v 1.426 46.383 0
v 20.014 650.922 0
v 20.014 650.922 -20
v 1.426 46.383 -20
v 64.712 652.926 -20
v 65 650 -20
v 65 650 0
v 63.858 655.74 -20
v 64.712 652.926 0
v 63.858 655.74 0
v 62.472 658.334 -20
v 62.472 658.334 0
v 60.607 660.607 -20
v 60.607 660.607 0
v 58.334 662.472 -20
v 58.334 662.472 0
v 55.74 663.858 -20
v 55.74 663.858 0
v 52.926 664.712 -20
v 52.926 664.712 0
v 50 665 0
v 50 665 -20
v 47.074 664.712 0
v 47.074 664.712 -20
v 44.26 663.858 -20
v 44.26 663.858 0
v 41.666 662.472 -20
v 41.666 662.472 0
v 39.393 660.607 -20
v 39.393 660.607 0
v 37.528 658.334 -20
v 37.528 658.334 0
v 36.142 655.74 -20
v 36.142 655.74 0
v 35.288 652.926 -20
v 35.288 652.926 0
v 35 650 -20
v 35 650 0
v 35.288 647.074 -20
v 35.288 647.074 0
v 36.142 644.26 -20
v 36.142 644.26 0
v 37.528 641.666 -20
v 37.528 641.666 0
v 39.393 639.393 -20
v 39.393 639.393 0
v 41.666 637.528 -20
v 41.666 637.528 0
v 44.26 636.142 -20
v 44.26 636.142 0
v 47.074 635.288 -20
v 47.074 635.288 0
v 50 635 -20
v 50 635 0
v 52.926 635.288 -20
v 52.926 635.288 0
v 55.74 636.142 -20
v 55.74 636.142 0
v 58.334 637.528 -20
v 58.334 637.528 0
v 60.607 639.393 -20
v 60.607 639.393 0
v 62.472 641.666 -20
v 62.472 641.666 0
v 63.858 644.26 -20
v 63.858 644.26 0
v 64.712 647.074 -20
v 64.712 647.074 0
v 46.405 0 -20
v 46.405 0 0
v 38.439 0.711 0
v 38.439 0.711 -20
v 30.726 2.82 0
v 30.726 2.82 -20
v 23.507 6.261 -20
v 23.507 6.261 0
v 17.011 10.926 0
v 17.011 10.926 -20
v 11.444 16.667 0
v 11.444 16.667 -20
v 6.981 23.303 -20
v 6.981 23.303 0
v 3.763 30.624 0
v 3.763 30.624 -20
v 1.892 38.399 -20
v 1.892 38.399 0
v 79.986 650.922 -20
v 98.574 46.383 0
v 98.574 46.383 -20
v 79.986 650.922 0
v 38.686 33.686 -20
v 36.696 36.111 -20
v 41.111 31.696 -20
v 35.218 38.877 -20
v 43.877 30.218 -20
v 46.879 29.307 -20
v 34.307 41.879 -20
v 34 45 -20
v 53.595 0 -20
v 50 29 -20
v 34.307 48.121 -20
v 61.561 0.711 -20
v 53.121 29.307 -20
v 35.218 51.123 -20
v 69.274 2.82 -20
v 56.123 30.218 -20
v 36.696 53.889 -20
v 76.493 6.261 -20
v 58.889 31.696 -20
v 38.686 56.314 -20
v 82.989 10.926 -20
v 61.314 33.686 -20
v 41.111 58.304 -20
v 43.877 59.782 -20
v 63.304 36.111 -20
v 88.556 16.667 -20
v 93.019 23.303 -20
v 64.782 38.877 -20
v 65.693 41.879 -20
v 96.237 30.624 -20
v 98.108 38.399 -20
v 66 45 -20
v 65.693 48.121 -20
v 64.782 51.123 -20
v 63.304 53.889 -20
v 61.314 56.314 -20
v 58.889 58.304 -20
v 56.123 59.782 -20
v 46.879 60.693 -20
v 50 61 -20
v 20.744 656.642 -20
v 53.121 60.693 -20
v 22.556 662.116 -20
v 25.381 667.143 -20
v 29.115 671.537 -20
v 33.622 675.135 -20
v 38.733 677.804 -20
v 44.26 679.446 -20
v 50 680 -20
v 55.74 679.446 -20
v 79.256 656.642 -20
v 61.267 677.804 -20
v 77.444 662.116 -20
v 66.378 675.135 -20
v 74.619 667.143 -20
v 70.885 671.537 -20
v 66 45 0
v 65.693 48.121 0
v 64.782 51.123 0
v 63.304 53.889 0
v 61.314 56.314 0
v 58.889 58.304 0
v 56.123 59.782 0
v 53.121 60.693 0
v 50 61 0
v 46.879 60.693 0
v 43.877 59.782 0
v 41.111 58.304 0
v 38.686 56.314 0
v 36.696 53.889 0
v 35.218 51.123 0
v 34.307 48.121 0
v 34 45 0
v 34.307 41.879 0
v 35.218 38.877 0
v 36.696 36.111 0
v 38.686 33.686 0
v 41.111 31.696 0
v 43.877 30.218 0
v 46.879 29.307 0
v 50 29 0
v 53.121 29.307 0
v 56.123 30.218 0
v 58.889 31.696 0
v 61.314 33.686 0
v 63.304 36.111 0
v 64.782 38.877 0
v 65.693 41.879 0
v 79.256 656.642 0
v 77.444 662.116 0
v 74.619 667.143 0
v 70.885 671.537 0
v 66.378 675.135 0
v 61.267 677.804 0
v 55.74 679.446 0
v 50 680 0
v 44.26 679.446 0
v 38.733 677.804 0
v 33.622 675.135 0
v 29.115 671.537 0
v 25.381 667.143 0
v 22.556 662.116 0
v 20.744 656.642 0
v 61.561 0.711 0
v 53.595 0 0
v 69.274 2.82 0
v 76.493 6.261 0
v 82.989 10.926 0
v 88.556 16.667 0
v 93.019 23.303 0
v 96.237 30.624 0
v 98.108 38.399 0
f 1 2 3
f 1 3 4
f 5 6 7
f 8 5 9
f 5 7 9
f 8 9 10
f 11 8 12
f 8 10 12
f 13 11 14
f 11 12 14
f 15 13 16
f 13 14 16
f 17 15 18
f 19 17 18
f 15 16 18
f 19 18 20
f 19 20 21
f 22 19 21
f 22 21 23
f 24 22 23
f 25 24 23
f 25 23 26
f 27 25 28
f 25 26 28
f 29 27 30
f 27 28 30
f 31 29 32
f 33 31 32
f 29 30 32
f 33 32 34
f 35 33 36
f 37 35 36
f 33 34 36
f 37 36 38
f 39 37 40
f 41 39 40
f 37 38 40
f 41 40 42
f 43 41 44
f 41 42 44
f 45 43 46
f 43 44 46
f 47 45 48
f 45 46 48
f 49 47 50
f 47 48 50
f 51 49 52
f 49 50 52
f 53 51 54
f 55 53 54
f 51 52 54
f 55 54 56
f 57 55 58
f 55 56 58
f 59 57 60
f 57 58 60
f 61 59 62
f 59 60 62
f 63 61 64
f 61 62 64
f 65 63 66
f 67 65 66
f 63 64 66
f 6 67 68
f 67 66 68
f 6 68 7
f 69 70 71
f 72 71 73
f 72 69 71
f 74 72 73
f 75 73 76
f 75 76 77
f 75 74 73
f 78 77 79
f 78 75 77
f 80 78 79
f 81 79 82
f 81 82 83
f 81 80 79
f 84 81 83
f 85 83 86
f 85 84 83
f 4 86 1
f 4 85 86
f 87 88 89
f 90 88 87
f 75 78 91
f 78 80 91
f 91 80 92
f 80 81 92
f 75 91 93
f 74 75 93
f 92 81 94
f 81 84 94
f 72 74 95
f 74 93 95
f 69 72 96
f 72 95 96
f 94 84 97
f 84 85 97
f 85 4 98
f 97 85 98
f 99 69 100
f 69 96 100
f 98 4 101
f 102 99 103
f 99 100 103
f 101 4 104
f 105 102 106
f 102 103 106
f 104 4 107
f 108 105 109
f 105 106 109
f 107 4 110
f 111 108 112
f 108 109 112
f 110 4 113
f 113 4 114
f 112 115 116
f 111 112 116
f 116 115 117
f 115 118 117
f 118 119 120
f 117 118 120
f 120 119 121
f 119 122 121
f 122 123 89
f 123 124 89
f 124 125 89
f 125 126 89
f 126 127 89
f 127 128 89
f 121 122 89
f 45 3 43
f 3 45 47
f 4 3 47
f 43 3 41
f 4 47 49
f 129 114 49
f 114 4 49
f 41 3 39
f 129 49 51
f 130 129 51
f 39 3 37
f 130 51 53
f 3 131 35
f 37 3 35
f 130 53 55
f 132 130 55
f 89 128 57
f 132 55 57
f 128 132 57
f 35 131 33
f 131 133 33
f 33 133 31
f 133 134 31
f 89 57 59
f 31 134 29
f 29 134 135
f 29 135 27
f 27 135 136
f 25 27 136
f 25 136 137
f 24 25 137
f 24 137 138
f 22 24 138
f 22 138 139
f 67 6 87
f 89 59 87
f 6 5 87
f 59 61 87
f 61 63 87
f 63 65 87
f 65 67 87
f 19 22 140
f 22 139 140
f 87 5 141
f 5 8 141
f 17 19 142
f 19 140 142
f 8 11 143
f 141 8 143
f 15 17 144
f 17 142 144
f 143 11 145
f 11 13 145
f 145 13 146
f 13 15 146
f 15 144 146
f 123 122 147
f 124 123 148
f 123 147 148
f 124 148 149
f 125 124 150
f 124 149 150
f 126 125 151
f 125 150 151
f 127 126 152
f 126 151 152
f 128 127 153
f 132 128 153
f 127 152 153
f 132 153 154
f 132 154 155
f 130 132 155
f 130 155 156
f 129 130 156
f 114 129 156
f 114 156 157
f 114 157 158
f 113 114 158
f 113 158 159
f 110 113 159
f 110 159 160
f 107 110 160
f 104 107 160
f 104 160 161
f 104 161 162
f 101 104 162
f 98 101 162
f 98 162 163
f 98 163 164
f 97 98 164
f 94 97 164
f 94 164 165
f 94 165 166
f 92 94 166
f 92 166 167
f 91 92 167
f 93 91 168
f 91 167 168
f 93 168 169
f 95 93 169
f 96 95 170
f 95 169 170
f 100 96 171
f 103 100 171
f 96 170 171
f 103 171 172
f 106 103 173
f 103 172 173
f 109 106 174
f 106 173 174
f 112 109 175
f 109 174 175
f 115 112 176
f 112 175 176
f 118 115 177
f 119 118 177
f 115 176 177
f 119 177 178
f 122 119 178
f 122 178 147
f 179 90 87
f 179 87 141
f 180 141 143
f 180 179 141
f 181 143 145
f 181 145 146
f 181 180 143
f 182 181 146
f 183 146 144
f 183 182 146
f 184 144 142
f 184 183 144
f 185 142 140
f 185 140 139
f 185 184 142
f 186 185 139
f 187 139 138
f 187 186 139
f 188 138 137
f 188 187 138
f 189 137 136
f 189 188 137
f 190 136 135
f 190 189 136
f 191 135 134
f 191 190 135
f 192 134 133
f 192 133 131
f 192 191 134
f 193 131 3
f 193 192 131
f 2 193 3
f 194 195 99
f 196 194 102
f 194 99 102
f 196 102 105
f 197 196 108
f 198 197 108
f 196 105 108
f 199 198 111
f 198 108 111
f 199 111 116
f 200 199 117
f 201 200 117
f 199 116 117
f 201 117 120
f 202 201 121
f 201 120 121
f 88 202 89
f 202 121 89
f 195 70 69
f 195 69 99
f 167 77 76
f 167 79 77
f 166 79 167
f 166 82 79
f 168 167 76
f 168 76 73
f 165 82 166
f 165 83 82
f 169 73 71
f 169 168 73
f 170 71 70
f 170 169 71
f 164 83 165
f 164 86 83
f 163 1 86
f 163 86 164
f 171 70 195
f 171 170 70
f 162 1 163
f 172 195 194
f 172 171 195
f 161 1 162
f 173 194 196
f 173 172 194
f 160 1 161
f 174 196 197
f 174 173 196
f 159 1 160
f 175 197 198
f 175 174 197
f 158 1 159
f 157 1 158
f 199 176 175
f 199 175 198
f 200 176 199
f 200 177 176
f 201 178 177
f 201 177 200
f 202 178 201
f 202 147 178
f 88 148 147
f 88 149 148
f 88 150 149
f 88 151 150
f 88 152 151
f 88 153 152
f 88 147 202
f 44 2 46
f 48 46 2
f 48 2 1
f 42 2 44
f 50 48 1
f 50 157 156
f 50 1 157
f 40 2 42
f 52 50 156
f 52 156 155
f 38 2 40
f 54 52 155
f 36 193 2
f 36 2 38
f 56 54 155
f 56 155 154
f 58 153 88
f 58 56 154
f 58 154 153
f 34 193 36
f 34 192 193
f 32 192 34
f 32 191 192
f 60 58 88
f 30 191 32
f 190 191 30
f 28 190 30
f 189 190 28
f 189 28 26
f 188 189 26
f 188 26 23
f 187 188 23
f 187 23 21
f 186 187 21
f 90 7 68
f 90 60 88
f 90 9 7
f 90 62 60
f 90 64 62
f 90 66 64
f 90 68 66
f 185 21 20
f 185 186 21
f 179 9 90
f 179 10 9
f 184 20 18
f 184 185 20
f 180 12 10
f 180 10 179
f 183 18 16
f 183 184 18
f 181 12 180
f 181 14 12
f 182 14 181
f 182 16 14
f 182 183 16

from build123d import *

# Parameters (mm, degrees)
ESQUISSE1_R               = 15
T_LE_DE_BASE_PLI_E1_DEPTH = 20
ESQUISSE6_R               = 16
ENL_V_MAT_EXTRU_1_DEPTH   = 688.604537507
CONG_4_R                  = 45


# Sheet-metal steps are written as plain solids
with BuildPart() as part:
    # Esquisse1 → Tôle de base pliée1 (new body)
    with BuildSketch(Plane.XY):
        with BuildLine():
            Line((0, 0), (100, 0))
            Line((100, 0), (79.985828991, 650.921986845))
            ThreePointArc((79.985828991, 650.921986845), (50, 680), (20.014171009, 650.921986845))
            Line((20.014171009, 650.921986845), (0, 0))
        make_face()
        with Locations((50, 650)):
            Circle(ESQUISSE1_R, mode=Mode.SUBTRACT)
    extrude(amount=-T_LE_DE_BASE_PLI_E1_DEPTH)

    # Esquisse6 → Enlèv. mat.-Extru.1 (cut, through all)
    with BuildSketch(Plane.XY):
        with Locations((50, 45)):
            Circle(ESQUISSE6_R)
    extrude(amount=-ENL_V_MAT_EXTRU_1_DEPTH, mode=Mode.SUBTRACT)

    # Congé4
    cong_4_edges = [part.edges().sort_by_distance(p)[0] for p in [
        (100, 0, -10),
        (0, 0, -10),
    ]]
    fillet(cong_4_edges, radius=CONG_4_R)


solid = part.part
